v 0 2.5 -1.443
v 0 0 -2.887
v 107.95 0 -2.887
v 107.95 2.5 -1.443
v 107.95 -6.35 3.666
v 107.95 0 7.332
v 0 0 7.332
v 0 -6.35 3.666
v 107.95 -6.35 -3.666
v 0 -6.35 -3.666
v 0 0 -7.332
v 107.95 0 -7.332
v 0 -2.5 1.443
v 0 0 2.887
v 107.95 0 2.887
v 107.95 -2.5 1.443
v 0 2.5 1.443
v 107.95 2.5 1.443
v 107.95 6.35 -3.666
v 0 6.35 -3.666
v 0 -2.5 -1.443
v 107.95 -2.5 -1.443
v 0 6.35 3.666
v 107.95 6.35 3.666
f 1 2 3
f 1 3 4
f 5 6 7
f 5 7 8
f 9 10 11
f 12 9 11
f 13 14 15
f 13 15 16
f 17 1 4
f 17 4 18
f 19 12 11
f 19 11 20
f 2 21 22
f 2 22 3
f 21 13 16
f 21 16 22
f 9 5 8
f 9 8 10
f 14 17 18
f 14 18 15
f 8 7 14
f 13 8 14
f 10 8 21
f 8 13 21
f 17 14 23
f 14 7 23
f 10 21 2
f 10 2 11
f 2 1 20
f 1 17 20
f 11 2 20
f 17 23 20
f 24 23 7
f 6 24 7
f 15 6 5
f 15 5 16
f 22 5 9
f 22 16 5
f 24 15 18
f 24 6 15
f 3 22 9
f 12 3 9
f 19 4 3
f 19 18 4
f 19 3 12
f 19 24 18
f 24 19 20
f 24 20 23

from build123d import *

# Parameters (mm, degrees)
BOSS_EXTRUDE1_DEPTH = 107.95


with BuildPart() as part:
    # Sketch1 → Boss-Extrude1 (new body)
    with BuildSketch(Plane(origin=(0, 0, 0), x_dir=(0, 0, -1), z_dir=(1, 0, 0))):
        Polygon((7.332348419, 0), (3.666174209, 6.35), (-3.666174209, 6.35), (-7.332348419, 0), (-3.666174209, -6.35), (3.666174209, -6.35), align=None)
        Polygon((2.886751346, 0), (1.443375673, 2.5), (-1.443375673, 2.5), (-2.886751346, 0), (-1.443375673, -2.5), (1.443375673, -2.5), align=None, mode=Mode.SUBTRACT)
    extrude(amount=BOSS_EXTRUDE1_DEPTH)


solid = part.part
